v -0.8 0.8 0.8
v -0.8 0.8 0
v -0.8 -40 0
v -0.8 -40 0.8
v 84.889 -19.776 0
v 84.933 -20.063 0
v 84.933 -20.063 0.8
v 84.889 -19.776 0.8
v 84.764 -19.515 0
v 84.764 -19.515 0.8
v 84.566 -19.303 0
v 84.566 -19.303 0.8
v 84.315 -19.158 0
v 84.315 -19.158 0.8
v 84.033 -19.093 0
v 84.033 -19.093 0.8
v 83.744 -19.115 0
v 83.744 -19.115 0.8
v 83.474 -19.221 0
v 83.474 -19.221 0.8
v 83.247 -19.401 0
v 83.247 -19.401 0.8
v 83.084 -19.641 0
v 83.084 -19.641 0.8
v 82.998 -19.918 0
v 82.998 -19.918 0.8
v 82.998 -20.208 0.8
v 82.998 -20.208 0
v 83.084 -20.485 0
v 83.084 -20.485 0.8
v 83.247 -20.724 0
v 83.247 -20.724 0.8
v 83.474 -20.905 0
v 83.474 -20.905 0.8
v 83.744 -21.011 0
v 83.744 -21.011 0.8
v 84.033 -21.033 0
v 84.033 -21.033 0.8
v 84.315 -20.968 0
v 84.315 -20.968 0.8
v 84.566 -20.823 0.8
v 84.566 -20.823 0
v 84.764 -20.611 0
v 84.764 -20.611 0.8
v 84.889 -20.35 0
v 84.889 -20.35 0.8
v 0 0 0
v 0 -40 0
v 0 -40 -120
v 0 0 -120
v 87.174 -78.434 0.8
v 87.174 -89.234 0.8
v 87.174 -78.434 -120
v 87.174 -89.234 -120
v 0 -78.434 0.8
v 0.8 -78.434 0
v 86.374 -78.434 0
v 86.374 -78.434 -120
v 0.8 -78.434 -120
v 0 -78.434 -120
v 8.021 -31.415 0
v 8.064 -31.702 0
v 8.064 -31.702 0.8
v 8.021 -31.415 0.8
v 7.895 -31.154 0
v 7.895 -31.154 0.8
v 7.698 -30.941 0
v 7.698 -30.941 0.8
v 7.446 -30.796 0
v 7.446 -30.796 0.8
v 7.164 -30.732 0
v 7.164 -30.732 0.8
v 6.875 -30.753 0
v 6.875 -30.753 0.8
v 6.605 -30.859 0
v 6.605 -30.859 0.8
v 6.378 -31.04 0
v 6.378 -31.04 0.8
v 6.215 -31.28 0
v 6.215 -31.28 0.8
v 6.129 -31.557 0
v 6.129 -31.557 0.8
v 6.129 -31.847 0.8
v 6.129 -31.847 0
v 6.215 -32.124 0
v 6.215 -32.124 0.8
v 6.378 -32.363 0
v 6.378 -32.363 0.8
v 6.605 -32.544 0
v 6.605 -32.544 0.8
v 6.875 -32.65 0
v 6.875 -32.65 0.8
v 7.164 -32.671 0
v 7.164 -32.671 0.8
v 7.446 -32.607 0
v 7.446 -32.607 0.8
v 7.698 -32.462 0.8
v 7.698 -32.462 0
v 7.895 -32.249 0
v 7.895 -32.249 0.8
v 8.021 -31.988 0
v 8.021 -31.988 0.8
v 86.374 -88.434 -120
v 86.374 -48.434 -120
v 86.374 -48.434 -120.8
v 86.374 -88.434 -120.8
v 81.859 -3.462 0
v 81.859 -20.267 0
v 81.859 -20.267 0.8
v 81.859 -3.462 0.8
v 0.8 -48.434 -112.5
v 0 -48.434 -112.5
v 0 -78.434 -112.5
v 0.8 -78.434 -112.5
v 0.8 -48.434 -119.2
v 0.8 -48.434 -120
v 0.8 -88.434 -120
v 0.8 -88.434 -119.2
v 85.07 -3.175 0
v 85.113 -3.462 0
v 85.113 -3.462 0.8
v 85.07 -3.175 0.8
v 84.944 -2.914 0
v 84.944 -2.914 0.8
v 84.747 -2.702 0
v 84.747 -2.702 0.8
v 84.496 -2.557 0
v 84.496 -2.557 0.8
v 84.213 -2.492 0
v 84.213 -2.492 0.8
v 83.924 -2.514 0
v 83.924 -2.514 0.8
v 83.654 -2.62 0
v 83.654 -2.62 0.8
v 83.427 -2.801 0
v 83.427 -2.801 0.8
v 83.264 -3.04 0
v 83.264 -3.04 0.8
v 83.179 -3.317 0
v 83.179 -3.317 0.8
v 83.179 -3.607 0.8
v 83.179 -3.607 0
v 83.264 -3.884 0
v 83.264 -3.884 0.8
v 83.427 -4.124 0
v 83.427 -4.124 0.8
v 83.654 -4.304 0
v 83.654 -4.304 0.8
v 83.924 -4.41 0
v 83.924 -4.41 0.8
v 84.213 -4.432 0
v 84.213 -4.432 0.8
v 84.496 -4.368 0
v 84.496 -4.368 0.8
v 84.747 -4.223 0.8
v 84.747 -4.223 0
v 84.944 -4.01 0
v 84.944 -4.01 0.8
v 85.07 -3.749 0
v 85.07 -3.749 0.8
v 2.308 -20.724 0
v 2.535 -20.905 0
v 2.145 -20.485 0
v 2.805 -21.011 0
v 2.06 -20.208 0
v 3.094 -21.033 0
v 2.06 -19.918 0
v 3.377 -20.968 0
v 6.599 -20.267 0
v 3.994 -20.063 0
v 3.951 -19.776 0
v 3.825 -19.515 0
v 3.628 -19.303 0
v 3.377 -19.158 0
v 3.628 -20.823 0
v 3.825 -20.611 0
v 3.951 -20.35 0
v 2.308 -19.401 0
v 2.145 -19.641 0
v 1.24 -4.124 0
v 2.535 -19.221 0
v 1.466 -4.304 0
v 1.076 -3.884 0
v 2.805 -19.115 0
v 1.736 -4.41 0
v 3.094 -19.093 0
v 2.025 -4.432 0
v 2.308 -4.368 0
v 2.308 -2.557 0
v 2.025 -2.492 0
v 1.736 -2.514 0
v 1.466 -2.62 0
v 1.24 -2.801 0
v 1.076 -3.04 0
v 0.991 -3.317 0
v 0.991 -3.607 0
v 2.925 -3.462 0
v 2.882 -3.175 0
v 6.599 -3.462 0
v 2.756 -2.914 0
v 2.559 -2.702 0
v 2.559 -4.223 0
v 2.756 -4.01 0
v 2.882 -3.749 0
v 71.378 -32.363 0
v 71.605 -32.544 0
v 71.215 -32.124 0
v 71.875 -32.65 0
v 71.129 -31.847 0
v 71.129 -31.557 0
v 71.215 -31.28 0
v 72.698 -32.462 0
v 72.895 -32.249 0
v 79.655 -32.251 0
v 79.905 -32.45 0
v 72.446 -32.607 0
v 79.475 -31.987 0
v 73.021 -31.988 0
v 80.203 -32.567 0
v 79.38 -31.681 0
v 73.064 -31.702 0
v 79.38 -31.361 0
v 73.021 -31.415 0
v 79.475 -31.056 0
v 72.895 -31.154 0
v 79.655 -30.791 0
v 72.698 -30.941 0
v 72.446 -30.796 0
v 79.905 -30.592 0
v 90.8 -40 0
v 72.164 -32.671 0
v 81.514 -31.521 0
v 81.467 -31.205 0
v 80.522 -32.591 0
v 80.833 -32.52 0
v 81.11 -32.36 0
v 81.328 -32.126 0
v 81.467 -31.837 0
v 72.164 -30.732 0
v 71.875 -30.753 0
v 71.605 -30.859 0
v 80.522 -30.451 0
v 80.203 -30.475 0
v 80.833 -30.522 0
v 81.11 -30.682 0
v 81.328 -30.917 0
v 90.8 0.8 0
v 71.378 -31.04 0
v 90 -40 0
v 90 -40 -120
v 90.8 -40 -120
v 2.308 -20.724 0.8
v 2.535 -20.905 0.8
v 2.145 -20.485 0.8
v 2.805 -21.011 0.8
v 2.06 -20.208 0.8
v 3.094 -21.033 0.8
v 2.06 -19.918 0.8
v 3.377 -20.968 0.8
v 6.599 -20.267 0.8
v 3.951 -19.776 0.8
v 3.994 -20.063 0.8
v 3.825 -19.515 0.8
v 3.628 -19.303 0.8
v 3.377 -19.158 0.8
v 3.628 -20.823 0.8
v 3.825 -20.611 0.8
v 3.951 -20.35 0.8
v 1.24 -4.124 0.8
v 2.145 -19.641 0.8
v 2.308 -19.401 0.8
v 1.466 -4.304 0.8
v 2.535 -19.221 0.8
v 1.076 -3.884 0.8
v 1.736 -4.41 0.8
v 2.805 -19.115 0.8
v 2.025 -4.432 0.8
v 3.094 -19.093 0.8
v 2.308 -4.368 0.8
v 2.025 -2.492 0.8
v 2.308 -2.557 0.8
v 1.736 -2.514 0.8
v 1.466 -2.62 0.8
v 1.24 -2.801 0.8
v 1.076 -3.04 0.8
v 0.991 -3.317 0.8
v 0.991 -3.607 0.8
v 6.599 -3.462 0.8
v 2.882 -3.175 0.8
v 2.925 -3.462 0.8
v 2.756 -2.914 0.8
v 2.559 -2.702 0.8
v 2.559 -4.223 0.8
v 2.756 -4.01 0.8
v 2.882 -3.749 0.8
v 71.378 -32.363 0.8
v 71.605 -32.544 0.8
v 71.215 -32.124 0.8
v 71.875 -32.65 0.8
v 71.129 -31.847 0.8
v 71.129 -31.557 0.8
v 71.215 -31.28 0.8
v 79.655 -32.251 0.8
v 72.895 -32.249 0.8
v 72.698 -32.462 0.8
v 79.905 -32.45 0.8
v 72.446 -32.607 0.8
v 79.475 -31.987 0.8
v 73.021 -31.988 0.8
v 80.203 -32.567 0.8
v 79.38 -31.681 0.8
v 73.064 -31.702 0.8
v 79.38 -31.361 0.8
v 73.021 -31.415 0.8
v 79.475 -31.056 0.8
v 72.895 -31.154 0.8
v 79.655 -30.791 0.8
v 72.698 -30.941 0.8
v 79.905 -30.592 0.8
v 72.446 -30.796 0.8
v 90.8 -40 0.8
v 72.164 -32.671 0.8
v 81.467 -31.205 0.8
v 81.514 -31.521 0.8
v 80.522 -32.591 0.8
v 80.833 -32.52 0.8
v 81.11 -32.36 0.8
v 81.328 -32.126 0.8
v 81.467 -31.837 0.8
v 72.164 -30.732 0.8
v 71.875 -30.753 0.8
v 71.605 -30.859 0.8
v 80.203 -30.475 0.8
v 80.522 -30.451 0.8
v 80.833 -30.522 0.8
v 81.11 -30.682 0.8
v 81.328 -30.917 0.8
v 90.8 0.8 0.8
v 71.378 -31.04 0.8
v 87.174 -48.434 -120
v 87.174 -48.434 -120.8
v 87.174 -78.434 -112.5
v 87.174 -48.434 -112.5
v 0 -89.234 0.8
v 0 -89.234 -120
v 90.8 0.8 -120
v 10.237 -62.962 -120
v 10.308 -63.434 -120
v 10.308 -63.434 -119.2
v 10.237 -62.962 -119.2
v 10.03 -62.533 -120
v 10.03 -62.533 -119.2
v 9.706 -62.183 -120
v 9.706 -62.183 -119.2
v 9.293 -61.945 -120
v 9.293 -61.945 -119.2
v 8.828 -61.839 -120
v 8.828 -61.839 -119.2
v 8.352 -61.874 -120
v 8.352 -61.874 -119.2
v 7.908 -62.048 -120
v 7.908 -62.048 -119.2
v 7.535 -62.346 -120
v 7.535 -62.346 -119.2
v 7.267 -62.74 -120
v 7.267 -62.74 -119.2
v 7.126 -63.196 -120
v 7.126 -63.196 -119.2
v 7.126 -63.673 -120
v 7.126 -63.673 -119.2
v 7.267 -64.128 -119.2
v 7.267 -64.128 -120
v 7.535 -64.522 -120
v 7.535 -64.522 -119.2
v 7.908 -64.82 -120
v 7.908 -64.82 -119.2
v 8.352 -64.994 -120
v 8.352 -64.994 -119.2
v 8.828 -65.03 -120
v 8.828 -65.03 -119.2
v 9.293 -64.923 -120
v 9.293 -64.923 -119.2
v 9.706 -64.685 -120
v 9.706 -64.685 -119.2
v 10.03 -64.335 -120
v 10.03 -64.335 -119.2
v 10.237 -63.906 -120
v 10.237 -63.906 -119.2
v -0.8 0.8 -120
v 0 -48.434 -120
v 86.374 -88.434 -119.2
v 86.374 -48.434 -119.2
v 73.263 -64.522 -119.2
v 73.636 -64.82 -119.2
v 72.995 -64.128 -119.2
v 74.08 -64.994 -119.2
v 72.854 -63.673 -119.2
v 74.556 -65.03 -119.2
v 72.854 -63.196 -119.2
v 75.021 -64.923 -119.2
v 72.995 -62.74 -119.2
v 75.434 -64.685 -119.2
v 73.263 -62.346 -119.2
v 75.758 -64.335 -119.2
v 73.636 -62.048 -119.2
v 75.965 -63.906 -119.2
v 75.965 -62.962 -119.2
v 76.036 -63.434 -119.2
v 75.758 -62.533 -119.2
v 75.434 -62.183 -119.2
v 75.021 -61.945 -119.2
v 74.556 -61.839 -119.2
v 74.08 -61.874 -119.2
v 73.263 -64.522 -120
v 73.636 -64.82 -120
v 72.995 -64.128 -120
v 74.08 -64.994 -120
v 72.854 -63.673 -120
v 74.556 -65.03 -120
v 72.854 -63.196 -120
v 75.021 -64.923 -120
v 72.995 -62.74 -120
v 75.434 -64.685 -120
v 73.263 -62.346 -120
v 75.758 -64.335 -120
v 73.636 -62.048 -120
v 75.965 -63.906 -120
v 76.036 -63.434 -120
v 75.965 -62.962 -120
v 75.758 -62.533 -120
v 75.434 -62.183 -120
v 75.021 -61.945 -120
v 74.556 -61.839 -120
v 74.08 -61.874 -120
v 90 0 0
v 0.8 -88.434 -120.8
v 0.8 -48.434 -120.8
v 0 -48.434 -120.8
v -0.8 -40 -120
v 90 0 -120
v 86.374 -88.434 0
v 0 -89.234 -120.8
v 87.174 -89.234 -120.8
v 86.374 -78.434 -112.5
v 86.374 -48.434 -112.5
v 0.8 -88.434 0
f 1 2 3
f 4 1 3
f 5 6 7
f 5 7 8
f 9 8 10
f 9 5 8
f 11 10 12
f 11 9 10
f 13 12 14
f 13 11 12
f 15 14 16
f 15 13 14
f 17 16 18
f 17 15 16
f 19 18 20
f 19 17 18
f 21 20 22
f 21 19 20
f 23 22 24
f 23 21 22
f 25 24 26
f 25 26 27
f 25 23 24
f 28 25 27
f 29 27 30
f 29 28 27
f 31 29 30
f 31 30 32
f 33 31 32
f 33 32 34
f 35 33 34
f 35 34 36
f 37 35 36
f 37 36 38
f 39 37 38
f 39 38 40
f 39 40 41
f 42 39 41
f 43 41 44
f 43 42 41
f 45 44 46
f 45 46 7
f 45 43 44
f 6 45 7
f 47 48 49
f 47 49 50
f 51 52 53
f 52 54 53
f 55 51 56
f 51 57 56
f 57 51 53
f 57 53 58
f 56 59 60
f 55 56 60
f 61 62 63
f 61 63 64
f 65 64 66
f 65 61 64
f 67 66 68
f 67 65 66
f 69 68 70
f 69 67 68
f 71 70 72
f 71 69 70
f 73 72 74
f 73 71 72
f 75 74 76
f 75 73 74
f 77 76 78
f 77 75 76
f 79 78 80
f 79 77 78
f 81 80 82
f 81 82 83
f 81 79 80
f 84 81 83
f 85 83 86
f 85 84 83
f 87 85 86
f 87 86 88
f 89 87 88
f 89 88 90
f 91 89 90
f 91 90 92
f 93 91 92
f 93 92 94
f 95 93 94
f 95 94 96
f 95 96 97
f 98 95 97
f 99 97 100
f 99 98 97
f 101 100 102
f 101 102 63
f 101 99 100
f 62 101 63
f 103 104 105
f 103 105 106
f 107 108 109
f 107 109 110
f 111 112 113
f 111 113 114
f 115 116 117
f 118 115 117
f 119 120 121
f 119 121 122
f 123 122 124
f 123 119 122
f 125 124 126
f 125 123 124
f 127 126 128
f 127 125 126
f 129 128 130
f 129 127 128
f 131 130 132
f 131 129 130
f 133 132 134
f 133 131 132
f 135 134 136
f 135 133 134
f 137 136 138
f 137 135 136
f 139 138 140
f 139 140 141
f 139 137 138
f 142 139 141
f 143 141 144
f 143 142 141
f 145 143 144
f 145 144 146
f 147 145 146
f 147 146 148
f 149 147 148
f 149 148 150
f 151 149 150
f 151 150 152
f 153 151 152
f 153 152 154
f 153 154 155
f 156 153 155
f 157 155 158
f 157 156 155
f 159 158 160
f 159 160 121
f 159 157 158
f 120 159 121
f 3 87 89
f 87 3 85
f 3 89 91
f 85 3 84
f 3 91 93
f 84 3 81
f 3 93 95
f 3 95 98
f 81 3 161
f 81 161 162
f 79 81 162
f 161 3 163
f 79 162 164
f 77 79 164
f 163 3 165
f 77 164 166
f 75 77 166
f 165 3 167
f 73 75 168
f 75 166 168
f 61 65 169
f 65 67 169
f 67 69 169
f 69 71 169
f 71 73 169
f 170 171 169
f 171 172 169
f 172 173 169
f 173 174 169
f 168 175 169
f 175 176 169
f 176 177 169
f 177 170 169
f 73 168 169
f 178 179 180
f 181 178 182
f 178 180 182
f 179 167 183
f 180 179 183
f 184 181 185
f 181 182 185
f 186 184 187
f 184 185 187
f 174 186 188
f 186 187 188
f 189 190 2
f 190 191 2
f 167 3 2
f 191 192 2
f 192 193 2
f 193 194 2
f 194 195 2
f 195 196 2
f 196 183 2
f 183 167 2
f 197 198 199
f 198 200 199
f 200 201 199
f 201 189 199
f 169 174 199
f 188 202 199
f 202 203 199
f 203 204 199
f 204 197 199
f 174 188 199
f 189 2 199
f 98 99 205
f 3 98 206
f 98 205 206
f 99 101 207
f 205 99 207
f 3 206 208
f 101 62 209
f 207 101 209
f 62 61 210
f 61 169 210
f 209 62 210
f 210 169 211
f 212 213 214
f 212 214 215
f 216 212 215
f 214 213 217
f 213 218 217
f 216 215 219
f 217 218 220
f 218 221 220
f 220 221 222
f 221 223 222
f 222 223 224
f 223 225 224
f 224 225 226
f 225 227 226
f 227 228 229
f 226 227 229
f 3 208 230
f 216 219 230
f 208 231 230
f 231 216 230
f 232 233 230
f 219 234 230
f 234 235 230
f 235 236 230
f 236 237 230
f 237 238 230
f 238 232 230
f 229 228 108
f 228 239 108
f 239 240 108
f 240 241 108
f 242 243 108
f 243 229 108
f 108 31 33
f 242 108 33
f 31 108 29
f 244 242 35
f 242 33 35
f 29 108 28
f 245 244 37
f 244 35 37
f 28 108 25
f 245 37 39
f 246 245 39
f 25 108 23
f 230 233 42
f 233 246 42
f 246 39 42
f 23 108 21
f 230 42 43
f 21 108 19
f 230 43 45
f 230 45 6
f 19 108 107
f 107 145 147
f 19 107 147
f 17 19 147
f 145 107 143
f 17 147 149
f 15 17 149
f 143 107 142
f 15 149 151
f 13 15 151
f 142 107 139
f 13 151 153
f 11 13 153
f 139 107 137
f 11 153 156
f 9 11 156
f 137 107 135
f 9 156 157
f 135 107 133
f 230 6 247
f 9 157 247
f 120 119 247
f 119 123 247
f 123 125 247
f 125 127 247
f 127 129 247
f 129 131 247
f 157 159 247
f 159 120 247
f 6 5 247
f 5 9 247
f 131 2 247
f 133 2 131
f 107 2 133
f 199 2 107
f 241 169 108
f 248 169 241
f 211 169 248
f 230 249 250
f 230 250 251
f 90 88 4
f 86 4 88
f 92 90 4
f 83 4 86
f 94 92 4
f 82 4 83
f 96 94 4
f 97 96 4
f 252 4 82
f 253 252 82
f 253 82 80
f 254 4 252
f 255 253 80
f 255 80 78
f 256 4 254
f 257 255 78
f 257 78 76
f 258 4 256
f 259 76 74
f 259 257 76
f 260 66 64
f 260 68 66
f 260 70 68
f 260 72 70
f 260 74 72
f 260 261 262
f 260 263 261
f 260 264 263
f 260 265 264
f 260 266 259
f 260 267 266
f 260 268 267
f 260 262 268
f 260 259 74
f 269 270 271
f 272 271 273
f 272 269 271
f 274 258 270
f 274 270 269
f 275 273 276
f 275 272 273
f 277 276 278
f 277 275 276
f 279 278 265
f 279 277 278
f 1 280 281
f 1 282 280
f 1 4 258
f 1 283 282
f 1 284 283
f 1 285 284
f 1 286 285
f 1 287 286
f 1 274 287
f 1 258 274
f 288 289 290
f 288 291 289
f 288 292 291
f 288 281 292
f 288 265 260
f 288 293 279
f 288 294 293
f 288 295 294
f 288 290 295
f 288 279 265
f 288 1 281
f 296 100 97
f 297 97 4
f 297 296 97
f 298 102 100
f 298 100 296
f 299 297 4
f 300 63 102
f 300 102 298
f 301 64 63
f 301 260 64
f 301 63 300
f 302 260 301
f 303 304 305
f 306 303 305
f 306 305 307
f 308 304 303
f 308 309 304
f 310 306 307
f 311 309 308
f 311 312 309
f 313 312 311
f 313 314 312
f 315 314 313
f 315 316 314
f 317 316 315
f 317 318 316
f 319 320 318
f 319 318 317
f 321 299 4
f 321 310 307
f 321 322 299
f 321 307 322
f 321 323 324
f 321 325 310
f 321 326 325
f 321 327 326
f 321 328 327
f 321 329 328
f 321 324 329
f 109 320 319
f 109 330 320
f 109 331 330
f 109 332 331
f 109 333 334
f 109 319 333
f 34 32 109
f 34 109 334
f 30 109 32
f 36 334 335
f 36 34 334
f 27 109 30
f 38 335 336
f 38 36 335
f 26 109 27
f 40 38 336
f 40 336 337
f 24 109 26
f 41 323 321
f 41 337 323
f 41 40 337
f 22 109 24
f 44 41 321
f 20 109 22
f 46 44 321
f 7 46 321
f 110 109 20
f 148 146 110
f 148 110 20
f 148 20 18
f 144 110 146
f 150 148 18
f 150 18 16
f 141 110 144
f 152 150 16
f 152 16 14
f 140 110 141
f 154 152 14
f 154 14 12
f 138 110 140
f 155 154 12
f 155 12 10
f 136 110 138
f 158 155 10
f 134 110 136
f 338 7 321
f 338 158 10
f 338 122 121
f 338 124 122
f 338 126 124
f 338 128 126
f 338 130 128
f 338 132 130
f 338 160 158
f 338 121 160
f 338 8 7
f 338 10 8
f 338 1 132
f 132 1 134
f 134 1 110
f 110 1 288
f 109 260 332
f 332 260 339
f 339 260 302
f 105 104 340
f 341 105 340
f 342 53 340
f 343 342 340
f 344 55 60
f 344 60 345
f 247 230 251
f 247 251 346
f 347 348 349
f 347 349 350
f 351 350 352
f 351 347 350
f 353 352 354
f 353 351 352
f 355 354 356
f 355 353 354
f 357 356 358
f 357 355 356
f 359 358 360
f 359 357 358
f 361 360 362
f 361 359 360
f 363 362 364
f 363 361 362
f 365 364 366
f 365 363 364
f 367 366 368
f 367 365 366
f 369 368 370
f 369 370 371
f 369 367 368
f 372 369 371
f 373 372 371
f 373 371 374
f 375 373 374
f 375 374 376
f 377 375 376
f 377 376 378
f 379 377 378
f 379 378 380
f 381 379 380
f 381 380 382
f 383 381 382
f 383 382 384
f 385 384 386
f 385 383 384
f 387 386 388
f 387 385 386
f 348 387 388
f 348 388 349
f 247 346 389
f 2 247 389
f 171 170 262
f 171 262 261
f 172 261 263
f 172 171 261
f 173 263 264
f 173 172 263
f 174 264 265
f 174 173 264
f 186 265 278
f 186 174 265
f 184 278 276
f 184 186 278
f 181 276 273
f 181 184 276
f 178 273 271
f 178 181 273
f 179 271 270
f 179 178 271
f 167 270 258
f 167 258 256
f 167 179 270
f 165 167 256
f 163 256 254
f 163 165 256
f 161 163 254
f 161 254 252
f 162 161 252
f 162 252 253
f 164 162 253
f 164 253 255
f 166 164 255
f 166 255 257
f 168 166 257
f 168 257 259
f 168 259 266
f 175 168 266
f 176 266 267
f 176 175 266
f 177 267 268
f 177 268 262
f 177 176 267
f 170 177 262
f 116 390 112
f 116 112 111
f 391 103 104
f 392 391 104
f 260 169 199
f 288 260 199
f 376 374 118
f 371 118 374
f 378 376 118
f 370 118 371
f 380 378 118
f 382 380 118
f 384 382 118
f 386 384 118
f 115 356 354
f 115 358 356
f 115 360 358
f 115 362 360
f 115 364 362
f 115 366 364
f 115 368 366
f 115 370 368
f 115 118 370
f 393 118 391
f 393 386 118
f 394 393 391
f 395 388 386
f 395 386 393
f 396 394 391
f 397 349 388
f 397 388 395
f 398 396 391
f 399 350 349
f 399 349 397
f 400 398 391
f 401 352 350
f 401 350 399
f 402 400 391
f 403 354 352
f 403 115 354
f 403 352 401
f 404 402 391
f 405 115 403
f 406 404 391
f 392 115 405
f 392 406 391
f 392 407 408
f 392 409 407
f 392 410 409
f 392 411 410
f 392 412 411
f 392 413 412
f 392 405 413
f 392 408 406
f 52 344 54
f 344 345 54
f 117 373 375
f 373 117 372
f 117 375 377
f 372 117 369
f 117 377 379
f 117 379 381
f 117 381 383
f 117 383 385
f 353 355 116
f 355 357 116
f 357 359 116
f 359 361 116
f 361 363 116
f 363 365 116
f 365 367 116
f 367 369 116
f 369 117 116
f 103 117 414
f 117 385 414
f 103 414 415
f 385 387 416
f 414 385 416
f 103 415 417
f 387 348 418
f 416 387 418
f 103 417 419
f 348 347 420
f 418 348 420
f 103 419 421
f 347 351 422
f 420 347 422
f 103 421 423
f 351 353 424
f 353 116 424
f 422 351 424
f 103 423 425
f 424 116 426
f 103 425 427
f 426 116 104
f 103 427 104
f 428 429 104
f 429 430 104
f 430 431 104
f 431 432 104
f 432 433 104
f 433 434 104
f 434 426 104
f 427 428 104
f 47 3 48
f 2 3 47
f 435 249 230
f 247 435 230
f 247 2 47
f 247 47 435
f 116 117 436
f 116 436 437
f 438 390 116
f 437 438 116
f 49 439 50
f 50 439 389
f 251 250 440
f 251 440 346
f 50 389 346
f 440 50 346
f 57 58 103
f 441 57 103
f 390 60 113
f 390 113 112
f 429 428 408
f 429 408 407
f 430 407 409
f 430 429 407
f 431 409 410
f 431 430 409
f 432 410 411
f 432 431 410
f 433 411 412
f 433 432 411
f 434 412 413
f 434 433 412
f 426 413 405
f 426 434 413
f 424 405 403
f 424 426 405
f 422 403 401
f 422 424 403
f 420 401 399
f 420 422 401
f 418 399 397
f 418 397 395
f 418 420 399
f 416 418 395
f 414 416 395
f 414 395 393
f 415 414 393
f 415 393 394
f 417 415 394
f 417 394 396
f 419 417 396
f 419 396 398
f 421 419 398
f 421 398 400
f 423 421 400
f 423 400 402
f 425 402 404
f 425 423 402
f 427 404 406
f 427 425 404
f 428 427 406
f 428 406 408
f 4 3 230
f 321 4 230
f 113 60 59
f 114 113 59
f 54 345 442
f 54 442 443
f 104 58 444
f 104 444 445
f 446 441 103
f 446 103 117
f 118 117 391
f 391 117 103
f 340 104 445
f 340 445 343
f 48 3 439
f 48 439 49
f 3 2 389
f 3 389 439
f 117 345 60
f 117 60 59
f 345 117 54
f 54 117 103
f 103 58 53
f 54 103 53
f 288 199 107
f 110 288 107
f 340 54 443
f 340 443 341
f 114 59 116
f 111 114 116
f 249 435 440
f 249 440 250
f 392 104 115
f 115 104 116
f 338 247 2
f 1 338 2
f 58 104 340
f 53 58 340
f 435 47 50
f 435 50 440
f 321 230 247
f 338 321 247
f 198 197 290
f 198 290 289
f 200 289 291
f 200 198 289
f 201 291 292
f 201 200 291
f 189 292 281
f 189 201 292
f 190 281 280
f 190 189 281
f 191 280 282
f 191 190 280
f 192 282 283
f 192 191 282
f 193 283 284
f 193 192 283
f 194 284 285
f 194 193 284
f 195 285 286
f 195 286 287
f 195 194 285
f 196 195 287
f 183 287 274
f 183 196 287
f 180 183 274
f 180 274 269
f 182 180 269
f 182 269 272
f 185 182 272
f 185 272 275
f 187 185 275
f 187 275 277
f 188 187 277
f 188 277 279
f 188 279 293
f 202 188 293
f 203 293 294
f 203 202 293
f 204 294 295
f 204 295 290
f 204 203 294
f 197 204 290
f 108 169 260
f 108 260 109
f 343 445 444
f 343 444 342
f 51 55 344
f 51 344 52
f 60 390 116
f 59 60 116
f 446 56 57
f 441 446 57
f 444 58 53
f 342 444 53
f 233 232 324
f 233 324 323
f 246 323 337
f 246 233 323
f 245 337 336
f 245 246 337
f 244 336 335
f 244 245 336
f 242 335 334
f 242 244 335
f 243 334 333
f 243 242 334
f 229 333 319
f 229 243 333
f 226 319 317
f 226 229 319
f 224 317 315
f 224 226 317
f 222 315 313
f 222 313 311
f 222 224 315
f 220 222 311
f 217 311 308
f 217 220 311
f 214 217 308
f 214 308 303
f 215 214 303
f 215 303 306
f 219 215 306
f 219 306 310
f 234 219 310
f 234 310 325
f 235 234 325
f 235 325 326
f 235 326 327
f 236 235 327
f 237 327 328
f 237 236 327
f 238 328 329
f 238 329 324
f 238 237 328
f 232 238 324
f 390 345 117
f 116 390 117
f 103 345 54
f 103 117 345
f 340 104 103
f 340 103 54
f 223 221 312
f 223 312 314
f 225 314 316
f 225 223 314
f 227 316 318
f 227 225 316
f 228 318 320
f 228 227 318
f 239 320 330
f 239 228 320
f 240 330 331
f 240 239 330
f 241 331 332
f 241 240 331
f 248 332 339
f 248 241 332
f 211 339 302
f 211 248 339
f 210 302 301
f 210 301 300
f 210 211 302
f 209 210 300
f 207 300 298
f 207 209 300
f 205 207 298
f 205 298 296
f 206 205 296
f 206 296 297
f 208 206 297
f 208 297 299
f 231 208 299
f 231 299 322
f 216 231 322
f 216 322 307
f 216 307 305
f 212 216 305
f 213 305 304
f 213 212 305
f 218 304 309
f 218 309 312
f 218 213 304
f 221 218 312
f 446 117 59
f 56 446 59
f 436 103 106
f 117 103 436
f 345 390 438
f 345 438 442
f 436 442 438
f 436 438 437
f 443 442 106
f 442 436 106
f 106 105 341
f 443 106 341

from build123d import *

# Parameters (mm, degrees)
F1_DEPTH  = 120
F0_W      = 90
F0_H      = 40
F0_R      = 0.9725861443
F0_R_2    = 1.0729216039
F0_W_2    = 75.2601372078
F0_H_2    = 16.8051975779
F2_DEPTH  = 0.8
F4_W      = 0.8
F4_H      = 30
F5_DEPTH  = 0.8
F6_DEPTH  = 120
F7_DEPTH  = 7.5
F8_W      = 85.5735123101
F8_H      = 10
F9_DEPTH  = 0.8
F4_R      = 1.6
F10_DEPTH = 0.8


with BuildPart() as f1:
    # F0 (on Top) → F1 (new body)
    with BuildSketch(Plane.XY):
        Polygon((0, -40), (0, 0), (90, 0), (90, -40), (90.8, -40), (90.8, 0.8), (-0.8, 0.8), (-0.8, -40), align=None)
    extrude(amount=-F1_DEPTH)


with BuildPart() as f2:
    # F0 (on Top) → F2 (new body)
    with BuildSketch(Plane.XY):
        Polygon((0, -40), (0, 0), (90, 0), (90, -40), (90.8, -40), (90.8, 0.8), (-0.8, 0.8), (-0.8, -40), align=None)
        with Locations((45, -20)):
            Rectangle(F0_W, F0_H)
        with Locations((7.0911361836, -31.7015498877)):
            Circle(F0_R, mode=Mode.SUBTRACT)
        with Locations((3.0214360449, -20.0629532337)):
            Circle(F0_R, mode=Mode.SUBTRACT)
        with Locations((72.0911361836, -31.7015498877)):
            Circle(F0_R, mode=Mode.SUBTRACT)
        with Locations((80.4413557053, -31.5211080015)):
            Circle(F0_R_2, mode=Mode.SUBTRACT)
        with Locations((83.9599892497, -20.0629532337)):
            Circle(F0_R, mode=Mode.SUBTRACT)
        with Locations((44.2290580831, -11.8647648487)):
            Rectangle(F0_W_2, F0_H_2, mode=Mode.SUBTRACT)
        with Locations((1.9526774995, -3.4621660598)):
            Circle(F0_R, mode=Mode.SUBTRACT)
        with Locations((84.1404348612, -3.4621660598)):
            Circle(F0_R, mode=Mode.SUBTRACT)
    extrude(amount=F2_DEPTH)


with BuildPart() as f5:
    # F4 (on offset) → F5 (new body)
    with BuildSketch(Plane.XY.offset(-120)):
        with Locations((0.4, -63.4340933131)):
            Rectangle(F4_W, F4_H)
        Polygon((0.8, -78.4340933131), (0, -78.4340933131), (0, -89.2340933131), (87.1735123101, -89.2340933131), (87.1735123101, -78.4340933131), (86.3735123101, -78.4340933131), (86.3735123101, -88.4340933131), (0.8, -88.4340933131), align=None)
        with Locations((86.7735123101, -63.4340933131)):
            Rectangle(F4_W, F4_H)
    extrude(amount=-F5_DEPTH)


with BuildPart() as f6:
    # F4 (on offset) → F6 (new body)
    with BuildSketch(Plane.XY.offset(-120)):
        Polygon((0.8, -78.4340933131), (0, -78.4340933131), (0, -89.2340933131), (87.1735123101, -89.2340933131), (87.1735123101, -78.4340933131), (86.3735123101, -78.4340933131), (86.3735123101, -88.4340933131), (0.8, -88.4340933131), align=None)
    extrude(amount=F6_DEPTH)

    # F8 (on face) → F9 (join)
    with BuildSketch(Plane.XY):
        Polygon((0, -78.4340933131), (0, -89.2340933131), (87.1735123101, -89.2340933131), (87.1735123101, -78.4340933131), (86.3735123101, -78.4340933131), (86.3735123101, -88.4340933131), (0.8, -88.4340933131), (0.8, -78.4340933131), align=None)
        with Locations((43.586756155, -83.4340933131)):
            Rectangle(F8_W, F8_H)
    extrude(amount=F9_DEPTH)


with BuildPart() as f7:
    # F4 (on offset) → F7 (new body)
    with BuildSketch(Plane.XY.offset(-120)):
        with Locations((86.7735123101, -63.4340933131)):
            Rectangle(F4_W, F4_H)
    extrude(amount=F7_DEPTH)


with BuildPart() as f7b:
    # F4 (on offset) → F7, piece 2 (new body)
    with BuildSketch(Plane.XY.offset(-120)):
        with Locations((0.4, -63.4340933131)):
            Rectangle(F4_W, F4_H)
    extrude(amount=F7_DEPTH)


with BuildPart() as f10:
    # F4 (on offset) → F10 (new body)
    with BuildSketch(Plane.XY.offset(-120)):
        Polygon((86.3735123101, -48.4340933131), (0.8, -48.4340933131), (0.8, -78.4340933131), (0.8, -88.4340933131), (86.3735123101, -88.4340933131), (86.3735123101, -78.4340933131), align=None)
        with Locations((8.708095178, -63.4340933131)):
            Circle(F4_R, mode=Mode.SUBTRACT)
        with Locations((74.4362887124, -63.4340933131)):
            Circle(F4_R, mode=Mode.SUBTRACT)
    extrude(amount=F10_DEPTH)


solid = Compound([f1.part, f2.part, f5.part, f6.part, f7.part, f7b.part, f10.part])
